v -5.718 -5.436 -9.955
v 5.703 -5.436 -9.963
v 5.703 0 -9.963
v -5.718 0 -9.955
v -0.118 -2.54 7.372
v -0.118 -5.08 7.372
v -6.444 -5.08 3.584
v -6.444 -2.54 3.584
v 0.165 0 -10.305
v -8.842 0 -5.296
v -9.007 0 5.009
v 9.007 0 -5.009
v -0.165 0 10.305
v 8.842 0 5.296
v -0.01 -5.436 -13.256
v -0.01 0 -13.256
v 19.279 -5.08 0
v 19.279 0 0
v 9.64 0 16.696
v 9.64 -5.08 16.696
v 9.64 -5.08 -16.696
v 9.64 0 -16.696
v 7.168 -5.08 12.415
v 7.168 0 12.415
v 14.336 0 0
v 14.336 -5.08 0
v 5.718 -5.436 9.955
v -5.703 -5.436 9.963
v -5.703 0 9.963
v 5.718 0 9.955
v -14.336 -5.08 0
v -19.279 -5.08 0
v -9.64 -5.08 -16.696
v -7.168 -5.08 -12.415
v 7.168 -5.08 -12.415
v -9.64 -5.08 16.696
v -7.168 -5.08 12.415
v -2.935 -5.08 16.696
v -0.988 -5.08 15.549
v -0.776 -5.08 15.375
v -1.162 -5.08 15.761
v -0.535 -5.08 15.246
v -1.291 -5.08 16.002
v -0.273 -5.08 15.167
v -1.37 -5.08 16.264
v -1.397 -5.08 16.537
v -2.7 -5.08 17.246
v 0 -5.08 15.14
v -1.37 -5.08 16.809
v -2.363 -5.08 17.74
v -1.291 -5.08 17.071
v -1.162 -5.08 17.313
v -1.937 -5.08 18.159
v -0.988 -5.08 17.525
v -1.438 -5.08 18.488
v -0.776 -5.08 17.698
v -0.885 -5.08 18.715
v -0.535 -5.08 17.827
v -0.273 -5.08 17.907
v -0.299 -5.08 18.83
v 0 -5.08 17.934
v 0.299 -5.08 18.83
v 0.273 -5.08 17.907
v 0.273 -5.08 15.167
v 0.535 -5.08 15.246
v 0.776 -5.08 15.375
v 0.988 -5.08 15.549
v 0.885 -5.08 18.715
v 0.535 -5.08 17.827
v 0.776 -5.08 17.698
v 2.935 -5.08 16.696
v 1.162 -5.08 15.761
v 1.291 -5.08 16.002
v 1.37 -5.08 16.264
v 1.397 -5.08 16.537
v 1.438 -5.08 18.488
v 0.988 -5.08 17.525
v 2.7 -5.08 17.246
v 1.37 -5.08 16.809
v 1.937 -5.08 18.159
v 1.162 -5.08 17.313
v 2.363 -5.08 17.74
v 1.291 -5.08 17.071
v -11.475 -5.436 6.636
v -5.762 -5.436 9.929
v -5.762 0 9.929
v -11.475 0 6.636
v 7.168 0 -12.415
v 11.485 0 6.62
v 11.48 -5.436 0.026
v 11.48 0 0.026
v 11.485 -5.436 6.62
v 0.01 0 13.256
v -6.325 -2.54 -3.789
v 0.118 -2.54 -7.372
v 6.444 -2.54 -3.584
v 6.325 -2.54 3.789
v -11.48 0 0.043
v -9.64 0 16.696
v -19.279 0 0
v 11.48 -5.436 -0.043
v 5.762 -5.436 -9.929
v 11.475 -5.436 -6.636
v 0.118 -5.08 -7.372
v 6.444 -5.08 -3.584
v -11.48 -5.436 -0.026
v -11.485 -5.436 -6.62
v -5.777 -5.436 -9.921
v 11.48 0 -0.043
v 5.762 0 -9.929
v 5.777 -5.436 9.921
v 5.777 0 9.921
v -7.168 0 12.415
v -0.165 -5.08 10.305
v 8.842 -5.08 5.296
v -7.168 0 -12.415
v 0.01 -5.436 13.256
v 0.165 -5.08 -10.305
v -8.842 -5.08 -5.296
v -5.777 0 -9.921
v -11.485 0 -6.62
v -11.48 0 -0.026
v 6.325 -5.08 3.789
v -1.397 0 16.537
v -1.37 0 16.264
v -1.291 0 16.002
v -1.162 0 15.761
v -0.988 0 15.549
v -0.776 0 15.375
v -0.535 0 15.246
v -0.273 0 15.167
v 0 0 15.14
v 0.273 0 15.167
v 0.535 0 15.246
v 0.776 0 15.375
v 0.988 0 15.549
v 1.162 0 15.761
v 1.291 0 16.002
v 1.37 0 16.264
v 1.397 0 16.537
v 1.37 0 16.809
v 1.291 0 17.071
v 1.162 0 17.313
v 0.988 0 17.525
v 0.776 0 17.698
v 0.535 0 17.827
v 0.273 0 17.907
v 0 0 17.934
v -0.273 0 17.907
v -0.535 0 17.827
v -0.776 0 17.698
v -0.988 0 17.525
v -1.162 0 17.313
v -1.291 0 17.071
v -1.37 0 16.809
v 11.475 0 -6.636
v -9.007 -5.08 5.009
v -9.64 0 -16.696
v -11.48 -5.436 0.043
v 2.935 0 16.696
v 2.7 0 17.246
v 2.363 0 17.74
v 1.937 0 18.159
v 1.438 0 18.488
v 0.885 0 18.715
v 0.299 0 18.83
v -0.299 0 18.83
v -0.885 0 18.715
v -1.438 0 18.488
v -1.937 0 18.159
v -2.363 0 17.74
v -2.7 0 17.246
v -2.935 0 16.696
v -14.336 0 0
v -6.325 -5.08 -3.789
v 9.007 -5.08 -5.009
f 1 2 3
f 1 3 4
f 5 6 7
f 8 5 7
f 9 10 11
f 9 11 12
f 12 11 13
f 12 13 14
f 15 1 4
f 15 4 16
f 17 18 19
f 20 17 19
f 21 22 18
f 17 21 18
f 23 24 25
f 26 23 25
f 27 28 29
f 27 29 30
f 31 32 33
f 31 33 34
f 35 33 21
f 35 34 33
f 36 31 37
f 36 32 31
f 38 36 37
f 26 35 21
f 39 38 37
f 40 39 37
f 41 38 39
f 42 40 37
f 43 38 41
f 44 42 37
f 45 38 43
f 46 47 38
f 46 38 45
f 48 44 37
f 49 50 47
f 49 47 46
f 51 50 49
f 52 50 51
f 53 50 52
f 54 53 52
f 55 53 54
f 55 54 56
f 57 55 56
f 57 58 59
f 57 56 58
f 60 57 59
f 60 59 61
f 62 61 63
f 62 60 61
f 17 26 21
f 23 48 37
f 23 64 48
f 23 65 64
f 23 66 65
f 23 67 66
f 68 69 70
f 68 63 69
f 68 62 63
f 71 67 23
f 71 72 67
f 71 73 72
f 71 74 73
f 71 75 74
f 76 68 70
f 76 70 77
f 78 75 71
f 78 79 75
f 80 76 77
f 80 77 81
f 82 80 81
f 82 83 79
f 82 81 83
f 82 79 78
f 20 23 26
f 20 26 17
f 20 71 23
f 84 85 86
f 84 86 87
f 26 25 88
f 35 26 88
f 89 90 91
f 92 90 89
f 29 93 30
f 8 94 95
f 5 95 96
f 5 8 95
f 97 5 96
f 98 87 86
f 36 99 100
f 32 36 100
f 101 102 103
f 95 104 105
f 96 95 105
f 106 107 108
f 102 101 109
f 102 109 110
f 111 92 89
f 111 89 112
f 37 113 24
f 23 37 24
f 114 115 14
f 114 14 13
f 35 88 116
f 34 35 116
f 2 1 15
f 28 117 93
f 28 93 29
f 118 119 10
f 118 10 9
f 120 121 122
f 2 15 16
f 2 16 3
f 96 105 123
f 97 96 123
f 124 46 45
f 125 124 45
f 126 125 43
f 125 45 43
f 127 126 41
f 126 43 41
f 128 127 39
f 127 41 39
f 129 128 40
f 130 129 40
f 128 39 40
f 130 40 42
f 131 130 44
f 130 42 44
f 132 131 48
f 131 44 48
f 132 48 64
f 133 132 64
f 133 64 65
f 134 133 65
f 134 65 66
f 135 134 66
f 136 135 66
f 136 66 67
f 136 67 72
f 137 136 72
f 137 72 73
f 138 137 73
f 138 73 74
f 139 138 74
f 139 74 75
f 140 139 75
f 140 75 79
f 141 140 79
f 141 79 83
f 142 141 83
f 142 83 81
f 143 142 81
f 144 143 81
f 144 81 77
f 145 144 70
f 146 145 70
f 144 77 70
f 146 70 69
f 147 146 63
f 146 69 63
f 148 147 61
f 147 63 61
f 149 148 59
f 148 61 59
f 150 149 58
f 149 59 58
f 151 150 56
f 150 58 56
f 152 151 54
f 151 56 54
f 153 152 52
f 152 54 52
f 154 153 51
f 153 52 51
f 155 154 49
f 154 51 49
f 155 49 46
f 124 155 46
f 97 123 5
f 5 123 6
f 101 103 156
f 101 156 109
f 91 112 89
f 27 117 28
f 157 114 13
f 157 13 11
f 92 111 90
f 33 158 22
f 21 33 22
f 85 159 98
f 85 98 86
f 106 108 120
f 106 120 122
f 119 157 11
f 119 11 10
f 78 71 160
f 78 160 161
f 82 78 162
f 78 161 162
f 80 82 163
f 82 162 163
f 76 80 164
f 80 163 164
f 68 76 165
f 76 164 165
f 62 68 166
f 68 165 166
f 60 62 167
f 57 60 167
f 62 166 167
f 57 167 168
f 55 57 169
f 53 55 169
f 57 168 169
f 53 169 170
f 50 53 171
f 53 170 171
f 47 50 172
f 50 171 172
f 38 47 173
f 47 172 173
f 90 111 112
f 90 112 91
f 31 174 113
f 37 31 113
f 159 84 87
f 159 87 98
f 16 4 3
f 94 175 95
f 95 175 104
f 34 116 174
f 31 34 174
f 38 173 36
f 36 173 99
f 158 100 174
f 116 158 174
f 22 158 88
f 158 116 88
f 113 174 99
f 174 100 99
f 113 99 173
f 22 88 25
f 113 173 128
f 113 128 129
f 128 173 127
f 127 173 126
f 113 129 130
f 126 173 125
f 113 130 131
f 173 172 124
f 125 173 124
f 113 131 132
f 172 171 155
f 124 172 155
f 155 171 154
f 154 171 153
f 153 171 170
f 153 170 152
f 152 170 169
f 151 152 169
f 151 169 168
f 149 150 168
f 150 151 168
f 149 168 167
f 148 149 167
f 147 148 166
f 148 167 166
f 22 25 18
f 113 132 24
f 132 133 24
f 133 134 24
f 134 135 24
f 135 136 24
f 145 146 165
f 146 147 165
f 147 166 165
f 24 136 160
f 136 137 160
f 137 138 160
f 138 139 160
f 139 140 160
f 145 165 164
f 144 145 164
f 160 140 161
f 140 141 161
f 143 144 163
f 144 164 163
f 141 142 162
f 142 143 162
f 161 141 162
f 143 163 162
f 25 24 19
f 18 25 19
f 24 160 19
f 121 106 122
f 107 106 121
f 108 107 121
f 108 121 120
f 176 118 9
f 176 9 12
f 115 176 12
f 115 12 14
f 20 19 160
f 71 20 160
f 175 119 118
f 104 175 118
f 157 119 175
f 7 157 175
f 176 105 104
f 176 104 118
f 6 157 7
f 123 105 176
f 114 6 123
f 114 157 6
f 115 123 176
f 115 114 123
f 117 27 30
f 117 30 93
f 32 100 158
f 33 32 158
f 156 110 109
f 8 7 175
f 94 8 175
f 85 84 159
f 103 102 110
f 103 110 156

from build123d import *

# Parameters (mm, degrees)
F1_DEPTH  = 5.08
F2_R      = 3.0783155003
F3_DEPTH  = 5.08
F5_D      = 2.794
F7_DEPTH  = 5.08
F8_SCALE  = 1.07
F10_DEPTH = 5.08
F11_DEPTH = 1.4986
F14_T     = -2.54


with BuildPart() as f1:
    # F0 (on Front) → F1 (new body)
    with BuildSketch(Plane.XZ):
        Polygon((-9.6395150281, -16.6961297889), (9.6395150281, -16.6961297889), (19.2790300561, 0), (9.6395150281, 16.6961297889), (-9.6395150281, 16.6961297889), (-19.2790300561, 0), align=None)
        Polygon((14.3360053558, 0), (7.1680026779, -12.4153448269), (-7.1680026779, -12.4153448269), (-14.3360053558, 0), (-7.1680026779, 12.4153448269), (7.1680026779, 12.4153448269), align=None, mode=Mode.SUBTRACT)
    extrude(amount=F1_DEPTH)

    # F2 (on Front) → F3 (join)
    with BuildSketch(Plane.XZ):
        with Locations((0, 15.7666336745)):
            Circle(F2_R)
    extrude(amount=F3_DEPTH)

    # F5 (through all)
    with Locations(Plane(origin=(0, 0, 0), x_dir=(1, 0, 0), z_dir=(0, 1, 0))):
        with Locations((0, -16.5367200971)):
            Hole(F5_D / 2)


with BuildPart() as f7:
    # F6 (on face) → F7 (new body)
    with BuildSketch(Plane.XZ.offset(5.08)):
        Polygon((5.3438666064, 9.3036550664), (0.0089031178, 12.3889116569), (-5.3300339055, 9.3115884774), align=None)
    extrude(amount=-F7_DEPTH)


with BuildPart() as f7b:
    # F6 (on face) → F7, piece 2 (new body)
    with BuildSketch(Plane.XZ.offset(5.08)):
        Polygon((10.733563779, 6.1867455022), (5.3990552183, 9.2717390039), (10.7291349388, 0.0239032976), align=None)
    extrude(amount=-F7_DEPTH)


with BuildPart() as f7c:
    # F6 (on face) → F7, piece 3 (new body)
    with BuildSketch(Plane.XZ.offset(5.08)):
        Polygon((-10.7290891237, 0.0398494735), (-5.3852683323, 9.2797517688), (-10.7246606612, 6.2021661546), align=None)
    extrude(amount=-F7_DEPTH)


with BuildPart() as f7d:
    # F6 (on face) → F7, piece 4 (new body)
    with BuildSketch(Plane.XZ.offset(5.08)):
        Polygon((10.7246606612, -6.2021661546), (10.7290891237, -0.0398494735), (5.3852683323, -9.2797517688), align=None)
    extrude(amount=-F7_DEPTH)


with BuildPart() as f7e:
    # F6 (on face) → F7, piece 5 (new body)
    with BuildSketch(Plane.XZ.offset(5.08)):
        Polygon((-5.3990552183, -9.2717390039), (-10.7291349388, -0.0239032976), (-10.733563779, -6.1867455022), align=None)
    extrude(amount=-F7_DEPTH)


with BuildPart() as f7f:
    # F6 (on face) → F7, piece 6 (new body)
    with BuildSketch(Plane.XZ.offset(5.08)):
        Polygon((-0.0089031178, -12.3889116569), (5.3300339055, -9.3115884774), (-5.3438666064, -9.3036550664), align=None)
    extrude(amount=-F7_DEPTH)


with BuildPart() as f7g:
    # F6 (on face) → F7, piece 7 (new body)
    with BuildSketch(Plane.XZ.offset(5.08)):
        Polygon((8.0364226741, -4.6477983427), (8.0398727238, -0.0059756613), (4.025102565, -6.9597615571), align=None)
    extrude(amount=-F7_DEPTH)


with BuildPart() as f7b_1:
    # F8: moved
    add(f7b.part.scale(F8_SCALE))


with BuildPart() as f7d_1:
    # F8: moved
    add(f7d.part.scale(F8_SCALE))


with BuildPart() as f7f_1:
    # F8: moved
    add(f7f.part.scale(F8_SCALE))


with BuildPart() as f7e_1:
    # F8: moved
    add(f7e.part.scale(F8_SCALE))


with BuildPart() as f7c_1:
    # F8: moved
    add(f7c.part.scale(F8_SCALE))


with BuildPart() as f7_1:
    # F8: moved
    add(f7.part.scale(F8_SCALE))


with BuildPart() as f10:
    # F9 (on face) → F10 (new body)
    with BuildSketch(Plane.XZ.offset(5.08)):
        Polygon((0.1654340336, -10.3049334588), (9.0070511764, -5.0091966537), (8.8416171429, 5.2957368051), (-0.1654340336, 10.3049334588), (-9.0070511764, 5.0091966537), (-8.8416171429, -5.2957368051), align=None)
    extrude(amount=-F10_DEPTH)

    # F14
    f14_openings = [f10.faces().sort_by_distance(p)[0] for p in [
        (0, -5.08, 0),
    ]]
    offset(amount=F14_T, openings=f14_openings)


with BuildPart() as f11:
    # F11 (new): a face of the model
    f11_faces = [f7g.part.faces().sort_by_distance(p)[0] for p in [
        (6.7004659876, -5.08, -3.8711785204),
    ]]
    extrude(f11_faces, amount=-F11_DEPTH)


solid = Compound([f1.part, f7b_1.part, f7d_1.part, f7f_1.part, f7e_1.part, f7c_1.part, f7_1.part, f10.part])
